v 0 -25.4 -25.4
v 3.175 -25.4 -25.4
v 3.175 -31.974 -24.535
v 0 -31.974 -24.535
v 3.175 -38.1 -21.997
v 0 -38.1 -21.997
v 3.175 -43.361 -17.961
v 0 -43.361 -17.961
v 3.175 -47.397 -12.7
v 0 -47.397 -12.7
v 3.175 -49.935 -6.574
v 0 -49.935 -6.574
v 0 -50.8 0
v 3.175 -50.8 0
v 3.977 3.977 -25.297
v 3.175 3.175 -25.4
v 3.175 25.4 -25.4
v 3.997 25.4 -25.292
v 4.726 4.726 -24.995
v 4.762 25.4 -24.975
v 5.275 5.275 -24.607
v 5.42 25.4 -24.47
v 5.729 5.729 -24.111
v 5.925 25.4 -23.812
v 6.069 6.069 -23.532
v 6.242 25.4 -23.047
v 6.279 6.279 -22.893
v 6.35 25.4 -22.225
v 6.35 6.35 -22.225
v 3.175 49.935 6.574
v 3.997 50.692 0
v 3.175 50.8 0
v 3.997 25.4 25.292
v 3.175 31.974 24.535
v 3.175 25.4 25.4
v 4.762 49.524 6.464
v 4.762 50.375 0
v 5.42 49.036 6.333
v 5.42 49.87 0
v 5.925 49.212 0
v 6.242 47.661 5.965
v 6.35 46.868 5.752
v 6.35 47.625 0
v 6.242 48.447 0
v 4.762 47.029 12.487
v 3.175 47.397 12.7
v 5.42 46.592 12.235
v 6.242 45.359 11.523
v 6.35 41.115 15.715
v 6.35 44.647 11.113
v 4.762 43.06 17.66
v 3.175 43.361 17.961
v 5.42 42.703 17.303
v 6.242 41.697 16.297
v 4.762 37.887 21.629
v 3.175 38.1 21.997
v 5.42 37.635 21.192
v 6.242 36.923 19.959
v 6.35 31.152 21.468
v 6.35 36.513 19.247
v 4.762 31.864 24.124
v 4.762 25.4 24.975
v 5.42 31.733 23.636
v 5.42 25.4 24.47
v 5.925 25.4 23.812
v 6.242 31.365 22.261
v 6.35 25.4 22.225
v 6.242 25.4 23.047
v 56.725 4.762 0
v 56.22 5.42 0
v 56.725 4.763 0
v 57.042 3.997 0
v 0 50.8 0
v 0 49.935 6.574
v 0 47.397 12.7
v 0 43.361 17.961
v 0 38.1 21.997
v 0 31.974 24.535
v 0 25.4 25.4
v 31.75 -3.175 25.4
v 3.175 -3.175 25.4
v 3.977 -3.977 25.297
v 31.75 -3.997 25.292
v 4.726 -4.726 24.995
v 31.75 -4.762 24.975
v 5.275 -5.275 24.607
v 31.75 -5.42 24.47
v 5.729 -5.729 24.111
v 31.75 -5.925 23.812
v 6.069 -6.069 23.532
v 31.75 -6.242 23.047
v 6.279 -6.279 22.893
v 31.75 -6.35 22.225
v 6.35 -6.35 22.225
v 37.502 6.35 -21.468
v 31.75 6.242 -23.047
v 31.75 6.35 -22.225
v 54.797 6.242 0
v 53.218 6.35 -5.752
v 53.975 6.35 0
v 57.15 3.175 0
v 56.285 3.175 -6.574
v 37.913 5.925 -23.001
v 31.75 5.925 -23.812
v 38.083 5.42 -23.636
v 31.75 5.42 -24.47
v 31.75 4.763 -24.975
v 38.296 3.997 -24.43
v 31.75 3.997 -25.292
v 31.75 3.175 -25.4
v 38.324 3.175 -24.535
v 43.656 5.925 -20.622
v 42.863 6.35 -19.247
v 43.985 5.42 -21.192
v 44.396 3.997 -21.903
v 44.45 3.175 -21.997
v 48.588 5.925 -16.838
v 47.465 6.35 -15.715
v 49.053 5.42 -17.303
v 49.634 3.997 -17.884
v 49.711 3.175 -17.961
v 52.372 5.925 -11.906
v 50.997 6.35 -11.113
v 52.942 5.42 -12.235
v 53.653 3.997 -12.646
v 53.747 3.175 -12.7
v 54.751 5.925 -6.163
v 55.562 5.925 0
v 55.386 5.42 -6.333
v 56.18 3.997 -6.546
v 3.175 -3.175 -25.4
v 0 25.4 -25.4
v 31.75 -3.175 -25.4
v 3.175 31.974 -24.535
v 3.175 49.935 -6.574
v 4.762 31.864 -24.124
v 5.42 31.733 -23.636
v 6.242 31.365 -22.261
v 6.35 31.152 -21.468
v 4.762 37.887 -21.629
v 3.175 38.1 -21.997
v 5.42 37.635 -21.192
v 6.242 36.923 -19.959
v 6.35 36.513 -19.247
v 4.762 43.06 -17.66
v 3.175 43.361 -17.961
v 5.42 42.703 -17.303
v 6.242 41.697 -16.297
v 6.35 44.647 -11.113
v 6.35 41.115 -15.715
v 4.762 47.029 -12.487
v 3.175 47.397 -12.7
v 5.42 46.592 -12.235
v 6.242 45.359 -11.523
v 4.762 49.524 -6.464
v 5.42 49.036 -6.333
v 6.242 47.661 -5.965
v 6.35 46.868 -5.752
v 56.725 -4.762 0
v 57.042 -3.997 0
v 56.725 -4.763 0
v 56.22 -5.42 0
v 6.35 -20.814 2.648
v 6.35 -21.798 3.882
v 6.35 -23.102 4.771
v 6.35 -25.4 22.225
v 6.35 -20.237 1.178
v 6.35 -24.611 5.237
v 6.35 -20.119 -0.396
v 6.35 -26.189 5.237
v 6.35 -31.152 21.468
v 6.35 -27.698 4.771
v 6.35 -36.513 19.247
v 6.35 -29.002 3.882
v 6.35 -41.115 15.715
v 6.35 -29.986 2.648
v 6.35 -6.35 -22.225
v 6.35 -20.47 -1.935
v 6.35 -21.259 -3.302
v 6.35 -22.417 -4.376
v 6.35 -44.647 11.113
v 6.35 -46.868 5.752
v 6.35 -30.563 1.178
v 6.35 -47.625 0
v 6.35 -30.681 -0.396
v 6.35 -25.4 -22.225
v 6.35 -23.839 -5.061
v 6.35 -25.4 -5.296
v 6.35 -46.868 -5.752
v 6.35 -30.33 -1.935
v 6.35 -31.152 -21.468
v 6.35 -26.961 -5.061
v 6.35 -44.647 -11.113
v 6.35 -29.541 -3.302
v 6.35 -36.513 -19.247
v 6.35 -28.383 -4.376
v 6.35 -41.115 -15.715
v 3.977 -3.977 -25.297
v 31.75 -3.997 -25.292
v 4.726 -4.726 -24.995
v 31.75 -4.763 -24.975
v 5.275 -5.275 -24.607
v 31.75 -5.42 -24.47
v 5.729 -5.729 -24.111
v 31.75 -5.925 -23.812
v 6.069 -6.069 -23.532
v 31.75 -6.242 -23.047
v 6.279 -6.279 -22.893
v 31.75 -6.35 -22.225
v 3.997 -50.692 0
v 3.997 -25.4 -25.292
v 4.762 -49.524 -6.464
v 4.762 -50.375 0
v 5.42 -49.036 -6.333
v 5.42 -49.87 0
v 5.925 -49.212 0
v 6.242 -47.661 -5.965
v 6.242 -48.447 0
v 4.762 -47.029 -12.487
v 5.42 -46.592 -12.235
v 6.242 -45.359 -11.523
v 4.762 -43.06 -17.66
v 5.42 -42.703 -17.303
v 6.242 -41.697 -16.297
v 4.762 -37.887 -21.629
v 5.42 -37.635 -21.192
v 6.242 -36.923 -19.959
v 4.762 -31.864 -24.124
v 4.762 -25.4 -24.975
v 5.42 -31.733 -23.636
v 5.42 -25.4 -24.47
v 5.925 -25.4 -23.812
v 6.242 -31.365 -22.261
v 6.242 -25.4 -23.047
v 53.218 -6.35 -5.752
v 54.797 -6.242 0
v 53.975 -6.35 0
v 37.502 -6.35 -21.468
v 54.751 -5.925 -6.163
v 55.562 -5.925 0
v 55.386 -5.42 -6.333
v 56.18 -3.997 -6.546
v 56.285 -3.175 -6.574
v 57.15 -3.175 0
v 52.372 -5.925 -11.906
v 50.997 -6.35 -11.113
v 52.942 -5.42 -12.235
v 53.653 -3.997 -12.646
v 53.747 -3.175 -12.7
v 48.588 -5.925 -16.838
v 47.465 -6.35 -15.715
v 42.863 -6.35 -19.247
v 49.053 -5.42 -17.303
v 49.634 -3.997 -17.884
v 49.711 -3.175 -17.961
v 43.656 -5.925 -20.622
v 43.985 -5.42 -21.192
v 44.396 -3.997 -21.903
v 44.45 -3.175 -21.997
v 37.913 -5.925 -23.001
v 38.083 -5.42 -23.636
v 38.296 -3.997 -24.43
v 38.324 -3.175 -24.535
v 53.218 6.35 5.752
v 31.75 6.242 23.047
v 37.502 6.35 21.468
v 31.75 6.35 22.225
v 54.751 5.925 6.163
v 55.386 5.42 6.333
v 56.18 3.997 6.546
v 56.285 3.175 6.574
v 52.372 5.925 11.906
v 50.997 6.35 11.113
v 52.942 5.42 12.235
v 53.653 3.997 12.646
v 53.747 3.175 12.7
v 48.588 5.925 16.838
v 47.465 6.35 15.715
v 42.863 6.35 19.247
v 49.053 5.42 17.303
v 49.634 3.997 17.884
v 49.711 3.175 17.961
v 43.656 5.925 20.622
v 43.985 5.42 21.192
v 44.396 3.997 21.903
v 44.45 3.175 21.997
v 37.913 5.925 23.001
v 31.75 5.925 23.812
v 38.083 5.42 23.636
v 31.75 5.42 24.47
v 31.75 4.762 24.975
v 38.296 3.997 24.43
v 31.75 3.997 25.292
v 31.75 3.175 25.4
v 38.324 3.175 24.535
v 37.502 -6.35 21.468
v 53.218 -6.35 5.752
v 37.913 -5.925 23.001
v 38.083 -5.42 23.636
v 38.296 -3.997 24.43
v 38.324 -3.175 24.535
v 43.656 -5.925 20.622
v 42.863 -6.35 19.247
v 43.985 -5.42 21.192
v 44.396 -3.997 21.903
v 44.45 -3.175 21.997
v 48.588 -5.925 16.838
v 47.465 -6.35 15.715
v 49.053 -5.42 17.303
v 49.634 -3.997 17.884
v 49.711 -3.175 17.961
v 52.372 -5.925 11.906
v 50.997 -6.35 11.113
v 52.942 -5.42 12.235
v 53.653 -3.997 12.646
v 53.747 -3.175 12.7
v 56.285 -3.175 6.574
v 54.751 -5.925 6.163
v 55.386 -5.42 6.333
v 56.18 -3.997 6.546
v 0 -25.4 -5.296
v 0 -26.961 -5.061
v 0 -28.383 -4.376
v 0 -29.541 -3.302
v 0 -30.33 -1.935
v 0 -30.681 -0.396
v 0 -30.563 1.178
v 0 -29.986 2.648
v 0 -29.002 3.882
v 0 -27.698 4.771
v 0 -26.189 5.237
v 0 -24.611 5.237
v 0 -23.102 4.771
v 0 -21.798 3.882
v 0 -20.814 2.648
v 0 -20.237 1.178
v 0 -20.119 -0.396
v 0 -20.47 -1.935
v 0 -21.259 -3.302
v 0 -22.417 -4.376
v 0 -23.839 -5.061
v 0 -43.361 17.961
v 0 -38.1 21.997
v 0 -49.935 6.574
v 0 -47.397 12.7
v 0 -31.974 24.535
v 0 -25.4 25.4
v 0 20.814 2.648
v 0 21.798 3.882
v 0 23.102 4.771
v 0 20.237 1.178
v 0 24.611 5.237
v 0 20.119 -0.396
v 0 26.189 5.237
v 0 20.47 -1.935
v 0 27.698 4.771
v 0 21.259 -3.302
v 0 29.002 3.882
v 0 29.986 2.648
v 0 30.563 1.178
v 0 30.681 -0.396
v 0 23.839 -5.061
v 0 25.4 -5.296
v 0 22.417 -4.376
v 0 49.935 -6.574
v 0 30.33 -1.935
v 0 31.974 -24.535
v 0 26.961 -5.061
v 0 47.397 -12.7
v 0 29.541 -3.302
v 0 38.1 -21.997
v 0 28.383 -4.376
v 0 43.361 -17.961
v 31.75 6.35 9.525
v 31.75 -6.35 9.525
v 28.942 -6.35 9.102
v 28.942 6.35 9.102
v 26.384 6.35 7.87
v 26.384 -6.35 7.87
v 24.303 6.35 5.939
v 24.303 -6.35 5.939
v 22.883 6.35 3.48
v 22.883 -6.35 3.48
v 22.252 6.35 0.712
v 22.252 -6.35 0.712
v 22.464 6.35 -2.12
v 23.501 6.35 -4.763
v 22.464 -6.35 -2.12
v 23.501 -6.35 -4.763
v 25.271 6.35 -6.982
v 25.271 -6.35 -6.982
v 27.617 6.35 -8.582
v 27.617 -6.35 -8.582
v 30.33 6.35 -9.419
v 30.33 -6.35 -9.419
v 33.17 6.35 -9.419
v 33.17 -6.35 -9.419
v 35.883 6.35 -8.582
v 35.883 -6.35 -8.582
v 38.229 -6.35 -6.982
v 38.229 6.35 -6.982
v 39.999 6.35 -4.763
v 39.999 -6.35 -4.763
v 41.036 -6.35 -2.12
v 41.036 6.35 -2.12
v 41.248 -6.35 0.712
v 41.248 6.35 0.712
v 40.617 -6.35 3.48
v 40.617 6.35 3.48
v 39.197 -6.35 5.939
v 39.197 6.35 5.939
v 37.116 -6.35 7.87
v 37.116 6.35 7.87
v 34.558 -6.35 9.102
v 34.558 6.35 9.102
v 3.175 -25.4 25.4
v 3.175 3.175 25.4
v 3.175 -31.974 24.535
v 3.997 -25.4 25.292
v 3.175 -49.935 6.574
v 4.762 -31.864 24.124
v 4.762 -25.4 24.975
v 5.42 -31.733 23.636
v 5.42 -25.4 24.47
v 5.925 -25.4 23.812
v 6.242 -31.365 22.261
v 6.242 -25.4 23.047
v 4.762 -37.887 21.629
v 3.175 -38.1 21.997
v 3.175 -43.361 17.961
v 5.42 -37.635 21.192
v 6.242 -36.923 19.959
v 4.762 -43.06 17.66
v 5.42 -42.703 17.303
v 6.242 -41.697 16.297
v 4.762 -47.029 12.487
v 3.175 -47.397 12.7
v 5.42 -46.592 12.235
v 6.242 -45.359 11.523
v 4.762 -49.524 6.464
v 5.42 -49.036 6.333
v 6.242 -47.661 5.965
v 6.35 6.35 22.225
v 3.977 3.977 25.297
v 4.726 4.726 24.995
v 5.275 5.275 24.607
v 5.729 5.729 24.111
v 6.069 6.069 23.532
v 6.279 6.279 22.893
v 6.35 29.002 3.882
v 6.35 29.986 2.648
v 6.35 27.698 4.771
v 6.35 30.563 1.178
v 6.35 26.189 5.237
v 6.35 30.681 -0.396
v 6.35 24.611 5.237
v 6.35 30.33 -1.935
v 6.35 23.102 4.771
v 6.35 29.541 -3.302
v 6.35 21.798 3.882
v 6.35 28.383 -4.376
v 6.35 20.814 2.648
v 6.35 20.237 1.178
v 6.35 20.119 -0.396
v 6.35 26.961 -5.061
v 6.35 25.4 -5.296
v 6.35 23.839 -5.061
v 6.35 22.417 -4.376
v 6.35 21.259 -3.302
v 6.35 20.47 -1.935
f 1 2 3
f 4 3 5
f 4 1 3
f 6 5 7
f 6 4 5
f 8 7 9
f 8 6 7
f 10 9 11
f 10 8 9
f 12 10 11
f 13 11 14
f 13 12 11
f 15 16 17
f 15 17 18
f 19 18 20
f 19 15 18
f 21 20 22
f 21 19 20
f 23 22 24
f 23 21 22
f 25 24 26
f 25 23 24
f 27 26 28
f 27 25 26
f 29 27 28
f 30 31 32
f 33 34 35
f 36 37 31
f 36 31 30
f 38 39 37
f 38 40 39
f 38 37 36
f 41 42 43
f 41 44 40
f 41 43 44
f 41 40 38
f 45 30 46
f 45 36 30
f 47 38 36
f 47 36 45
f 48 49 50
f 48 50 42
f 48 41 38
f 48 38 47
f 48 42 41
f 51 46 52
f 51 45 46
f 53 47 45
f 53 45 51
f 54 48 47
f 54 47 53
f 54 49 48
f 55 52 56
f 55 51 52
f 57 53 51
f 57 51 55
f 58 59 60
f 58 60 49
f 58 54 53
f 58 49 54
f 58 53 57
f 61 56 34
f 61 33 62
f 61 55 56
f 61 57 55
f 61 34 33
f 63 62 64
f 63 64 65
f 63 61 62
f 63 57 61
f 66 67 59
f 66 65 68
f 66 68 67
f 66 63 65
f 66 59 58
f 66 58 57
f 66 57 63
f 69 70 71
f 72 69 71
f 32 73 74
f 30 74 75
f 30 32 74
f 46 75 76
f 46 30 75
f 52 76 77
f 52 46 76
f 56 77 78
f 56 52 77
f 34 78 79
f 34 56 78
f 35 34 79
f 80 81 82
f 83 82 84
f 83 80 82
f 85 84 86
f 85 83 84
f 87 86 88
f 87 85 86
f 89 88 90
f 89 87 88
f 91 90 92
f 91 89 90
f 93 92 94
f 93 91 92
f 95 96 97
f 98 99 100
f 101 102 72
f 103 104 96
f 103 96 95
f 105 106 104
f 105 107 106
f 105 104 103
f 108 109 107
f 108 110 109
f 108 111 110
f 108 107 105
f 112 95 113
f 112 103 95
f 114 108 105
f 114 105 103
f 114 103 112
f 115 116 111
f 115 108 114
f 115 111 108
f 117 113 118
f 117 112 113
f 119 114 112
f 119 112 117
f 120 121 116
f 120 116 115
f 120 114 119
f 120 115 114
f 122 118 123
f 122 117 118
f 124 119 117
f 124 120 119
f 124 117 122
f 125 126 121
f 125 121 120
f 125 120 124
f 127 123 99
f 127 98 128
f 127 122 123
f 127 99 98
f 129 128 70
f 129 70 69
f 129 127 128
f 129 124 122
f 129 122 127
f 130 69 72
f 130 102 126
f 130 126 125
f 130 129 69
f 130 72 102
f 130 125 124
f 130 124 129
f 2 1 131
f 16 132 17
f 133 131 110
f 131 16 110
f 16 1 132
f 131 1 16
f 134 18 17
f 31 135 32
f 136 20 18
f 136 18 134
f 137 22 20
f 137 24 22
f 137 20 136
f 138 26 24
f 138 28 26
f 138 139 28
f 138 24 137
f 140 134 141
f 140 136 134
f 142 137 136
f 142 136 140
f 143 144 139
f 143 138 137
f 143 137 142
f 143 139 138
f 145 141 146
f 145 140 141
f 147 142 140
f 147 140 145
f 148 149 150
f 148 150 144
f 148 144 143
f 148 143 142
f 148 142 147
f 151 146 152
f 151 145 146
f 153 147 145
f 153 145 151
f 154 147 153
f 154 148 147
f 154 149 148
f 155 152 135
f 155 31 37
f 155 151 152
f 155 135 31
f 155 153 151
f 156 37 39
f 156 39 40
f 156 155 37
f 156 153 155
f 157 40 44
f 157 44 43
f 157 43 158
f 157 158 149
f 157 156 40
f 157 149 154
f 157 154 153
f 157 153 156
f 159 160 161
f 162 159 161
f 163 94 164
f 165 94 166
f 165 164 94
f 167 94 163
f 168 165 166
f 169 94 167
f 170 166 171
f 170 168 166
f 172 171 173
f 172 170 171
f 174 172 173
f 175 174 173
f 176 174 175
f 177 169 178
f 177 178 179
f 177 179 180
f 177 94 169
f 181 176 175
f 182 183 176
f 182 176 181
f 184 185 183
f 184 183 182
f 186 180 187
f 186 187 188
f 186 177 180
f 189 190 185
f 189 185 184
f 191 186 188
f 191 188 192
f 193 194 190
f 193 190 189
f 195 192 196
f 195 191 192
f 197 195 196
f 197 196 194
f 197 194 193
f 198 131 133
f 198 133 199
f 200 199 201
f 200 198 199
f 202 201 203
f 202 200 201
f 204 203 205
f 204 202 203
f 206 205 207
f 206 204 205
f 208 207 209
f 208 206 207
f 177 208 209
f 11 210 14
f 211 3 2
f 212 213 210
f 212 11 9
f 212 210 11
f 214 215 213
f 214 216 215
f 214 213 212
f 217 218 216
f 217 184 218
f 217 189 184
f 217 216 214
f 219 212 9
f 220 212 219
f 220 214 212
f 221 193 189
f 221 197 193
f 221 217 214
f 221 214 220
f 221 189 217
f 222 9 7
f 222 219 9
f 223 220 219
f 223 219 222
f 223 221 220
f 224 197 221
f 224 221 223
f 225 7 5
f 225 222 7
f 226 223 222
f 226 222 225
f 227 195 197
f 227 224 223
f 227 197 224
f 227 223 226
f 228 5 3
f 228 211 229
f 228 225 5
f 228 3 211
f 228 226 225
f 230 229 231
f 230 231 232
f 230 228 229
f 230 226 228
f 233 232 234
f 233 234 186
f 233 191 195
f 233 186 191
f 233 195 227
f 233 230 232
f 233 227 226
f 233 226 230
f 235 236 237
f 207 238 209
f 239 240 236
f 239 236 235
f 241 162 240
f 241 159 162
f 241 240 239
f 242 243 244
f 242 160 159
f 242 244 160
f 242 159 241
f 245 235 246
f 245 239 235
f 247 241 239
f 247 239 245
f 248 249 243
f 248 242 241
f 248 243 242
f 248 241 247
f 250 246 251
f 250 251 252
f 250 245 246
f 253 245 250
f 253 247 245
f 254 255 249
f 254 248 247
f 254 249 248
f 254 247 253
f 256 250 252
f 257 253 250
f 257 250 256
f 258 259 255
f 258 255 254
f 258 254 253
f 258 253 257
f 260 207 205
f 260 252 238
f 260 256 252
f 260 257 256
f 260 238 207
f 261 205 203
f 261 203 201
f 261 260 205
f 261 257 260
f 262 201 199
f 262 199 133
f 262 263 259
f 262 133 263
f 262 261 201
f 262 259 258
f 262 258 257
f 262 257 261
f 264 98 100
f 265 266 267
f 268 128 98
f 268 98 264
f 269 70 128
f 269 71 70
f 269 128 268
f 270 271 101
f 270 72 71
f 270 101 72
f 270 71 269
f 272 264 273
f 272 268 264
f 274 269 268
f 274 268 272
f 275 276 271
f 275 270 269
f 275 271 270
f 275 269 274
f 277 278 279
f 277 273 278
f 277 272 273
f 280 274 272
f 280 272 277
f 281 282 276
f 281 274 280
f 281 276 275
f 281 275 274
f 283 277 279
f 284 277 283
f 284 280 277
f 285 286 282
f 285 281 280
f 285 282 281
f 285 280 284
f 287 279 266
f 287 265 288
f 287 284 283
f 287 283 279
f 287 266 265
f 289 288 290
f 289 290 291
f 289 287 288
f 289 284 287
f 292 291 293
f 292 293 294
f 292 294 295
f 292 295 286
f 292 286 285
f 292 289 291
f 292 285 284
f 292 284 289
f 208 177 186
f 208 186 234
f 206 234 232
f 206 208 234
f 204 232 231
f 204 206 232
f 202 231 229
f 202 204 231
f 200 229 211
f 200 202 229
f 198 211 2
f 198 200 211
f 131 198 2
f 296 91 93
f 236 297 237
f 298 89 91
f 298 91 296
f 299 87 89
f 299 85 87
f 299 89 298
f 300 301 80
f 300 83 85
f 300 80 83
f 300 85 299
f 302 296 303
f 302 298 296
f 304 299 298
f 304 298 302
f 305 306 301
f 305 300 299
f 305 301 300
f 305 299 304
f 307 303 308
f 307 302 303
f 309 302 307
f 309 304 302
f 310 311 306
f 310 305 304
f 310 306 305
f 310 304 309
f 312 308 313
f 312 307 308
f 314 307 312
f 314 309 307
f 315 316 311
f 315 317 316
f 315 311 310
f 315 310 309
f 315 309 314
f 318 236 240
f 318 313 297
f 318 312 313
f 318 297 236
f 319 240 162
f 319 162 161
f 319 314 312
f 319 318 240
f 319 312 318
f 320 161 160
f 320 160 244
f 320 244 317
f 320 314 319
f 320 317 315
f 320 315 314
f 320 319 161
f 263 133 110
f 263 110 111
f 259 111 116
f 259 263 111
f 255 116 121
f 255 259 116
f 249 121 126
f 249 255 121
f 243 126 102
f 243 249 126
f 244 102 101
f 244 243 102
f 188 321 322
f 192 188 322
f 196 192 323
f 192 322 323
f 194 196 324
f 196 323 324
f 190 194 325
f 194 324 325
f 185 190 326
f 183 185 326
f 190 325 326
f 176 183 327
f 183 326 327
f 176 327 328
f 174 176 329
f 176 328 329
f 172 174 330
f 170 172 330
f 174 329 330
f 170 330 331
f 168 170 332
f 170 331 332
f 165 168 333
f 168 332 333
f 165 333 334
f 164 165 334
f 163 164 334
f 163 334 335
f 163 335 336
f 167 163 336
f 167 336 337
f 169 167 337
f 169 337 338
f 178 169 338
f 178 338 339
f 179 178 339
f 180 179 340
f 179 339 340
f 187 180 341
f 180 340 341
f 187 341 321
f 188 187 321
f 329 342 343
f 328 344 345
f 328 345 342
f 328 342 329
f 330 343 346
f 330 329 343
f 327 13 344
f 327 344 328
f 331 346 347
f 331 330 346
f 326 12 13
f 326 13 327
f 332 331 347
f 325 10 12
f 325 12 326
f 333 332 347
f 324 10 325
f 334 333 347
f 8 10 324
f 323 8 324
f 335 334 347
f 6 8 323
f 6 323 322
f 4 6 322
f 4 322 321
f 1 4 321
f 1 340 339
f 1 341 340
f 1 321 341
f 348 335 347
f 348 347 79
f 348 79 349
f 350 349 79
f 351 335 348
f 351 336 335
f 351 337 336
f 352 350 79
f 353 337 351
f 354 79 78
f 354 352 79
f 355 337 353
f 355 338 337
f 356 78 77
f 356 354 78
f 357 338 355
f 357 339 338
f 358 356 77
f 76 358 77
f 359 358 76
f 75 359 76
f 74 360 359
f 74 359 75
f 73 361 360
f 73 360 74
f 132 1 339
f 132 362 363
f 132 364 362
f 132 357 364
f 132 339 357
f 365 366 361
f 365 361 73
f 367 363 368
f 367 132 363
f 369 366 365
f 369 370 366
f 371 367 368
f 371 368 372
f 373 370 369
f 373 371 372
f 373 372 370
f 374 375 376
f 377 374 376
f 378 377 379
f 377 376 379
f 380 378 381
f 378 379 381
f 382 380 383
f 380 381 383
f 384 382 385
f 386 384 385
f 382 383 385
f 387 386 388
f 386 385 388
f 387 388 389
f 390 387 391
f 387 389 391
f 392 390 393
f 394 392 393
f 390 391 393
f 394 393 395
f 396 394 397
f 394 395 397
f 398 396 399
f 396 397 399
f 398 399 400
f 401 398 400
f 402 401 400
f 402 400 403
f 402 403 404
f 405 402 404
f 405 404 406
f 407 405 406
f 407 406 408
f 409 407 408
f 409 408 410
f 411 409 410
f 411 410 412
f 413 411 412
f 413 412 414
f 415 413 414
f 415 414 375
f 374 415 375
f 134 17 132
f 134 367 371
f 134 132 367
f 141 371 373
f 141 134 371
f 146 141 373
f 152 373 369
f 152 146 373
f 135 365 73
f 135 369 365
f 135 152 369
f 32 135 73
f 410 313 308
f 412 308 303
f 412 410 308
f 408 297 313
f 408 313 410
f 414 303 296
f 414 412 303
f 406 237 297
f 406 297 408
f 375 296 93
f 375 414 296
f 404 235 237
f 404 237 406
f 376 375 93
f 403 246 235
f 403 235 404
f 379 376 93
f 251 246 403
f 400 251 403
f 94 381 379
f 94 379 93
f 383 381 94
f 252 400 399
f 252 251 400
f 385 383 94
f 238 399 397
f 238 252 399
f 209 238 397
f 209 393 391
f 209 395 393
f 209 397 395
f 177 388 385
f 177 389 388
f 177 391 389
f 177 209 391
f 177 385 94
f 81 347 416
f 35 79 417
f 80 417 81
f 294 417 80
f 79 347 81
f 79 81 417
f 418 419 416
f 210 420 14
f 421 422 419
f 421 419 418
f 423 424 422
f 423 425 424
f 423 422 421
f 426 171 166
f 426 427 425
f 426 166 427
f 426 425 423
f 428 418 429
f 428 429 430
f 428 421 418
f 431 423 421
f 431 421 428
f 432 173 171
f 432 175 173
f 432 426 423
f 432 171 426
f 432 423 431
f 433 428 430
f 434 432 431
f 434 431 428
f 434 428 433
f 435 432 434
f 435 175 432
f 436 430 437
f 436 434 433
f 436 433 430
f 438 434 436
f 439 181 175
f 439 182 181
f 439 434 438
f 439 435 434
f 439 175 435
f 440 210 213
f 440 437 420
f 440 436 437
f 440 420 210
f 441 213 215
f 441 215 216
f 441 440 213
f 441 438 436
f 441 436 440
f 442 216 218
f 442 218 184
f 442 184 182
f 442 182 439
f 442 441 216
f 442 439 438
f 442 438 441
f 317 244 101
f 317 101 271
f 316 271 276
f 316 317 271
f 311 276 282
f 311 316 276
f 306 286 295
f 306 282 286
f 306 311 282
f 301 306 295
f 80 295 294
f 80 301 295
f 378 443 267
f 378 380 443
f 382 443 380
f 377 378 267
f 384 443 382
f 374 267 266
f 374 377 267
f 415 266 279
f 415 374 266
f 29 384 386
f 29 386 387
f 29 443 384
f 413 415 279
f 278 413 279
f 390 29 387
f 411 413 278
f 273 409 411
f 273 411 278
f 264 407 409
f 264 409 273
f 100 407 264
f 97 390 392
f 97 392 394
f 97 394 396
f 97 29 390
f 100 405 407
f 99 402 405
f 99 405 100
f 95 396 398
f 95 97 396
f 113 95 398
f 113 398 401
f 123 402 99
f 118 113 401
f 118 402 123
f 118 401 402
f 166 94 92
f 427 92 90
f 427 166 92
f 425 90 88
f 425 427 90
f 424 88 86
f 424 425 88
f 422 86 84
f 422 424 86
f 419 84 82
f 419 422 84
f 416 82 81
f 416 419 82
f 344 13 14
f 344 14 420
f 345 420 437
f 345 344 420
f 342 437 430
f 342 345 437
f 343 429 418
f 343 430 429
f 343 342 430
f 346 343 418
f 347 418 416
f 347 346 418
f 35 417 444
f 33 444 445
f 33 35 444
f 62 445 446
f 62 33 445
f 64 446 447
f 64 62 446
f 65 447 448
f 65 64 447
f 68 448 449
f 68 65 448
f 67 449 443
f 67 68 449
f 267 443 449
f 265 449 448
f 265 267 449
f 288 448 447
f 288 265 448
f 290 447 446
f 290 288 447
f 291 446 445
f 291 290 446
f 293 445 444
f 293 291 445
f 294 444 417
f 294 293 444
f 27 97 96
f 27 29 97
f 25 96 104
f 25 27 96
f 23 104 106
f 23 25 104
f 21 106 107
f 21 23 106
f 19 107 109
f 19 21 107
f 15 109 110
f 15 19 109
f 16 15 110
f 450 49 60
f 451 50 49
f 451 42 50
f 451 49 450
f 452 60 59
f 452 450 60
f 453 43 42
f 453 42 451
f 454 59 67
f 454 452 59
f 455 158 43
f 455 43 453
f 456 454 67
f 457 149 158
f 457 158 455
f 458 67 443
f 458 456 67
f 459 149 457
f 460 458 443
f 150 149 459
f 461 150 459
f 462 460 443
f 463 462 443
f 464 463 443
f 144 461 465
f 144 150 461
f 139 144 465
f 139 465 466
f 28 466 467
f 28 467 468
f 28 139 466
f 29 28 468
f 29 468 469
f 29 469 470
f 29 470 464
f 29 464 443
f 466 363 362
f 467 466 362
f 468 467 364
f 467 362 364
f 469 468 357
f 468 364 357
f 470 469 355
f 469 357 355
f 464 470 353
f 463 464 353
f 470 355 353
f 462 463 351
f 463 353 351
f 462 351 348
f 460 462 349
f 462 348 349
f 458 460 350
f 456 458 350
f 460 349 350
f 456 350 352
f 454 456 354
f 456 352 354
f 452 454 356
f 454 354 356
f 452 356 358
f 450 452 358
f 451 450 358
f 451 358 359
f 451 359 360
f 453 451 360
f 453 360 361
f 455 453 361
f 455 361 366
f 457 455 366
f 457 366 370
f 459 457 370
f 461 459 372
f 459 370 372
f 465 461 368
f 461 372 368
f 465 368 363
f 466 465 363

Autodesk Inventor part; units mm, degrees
ref_plane "YZ Plane" through (0, 0, 0) normal (1, 0, 0) x (0, 1, 0)
ref_plane "XZ Plane" through (0, 0, 0) normal (0, 1, 0) x (-1, 0, 0)
ref_plane "XY Plane" through (0, 0, 0) normal (0, 0, 1) x (1, 0, 0)
sketch "Sketch1" plane through (0, 0, 0) normal (0, 0, 1) x (1, 0, 0)
  line L0 (0, -50.8) -> (0, 50.8)
  line L1 (0, 50.8) -> (6.35, 50.8)
  line L2 (6.35, 50.8) -> (6.35, 6.35)
  line L3 (6.35, 6.35) -> (57.15, 6.35)
  line L4 (57.15, 6.35) -> (57.15, -6.35)
  line L5 (57.15, -6.35) -> (6.35, -6.35)
  line L6 (6.35, -6.35) -> (6.35, -50.8)
  line L7 (6.35, -50.8) -> (0, -50.8)
  line L8 (0, 0) -> (57.15, 0) construction
  dimension "d0" = 12.7
  dimension "d1" = 101.6
  dimension "d2" = 50.8
  dimension "d3" = 6.35
extrude "Extrusion1" add sketch "Sketch1" along normal mid plane 50.8
fillet "Fillet1" radius 25.4 6 edges at (57.15, 0, 25.4) (57.15, 0, -25.4) (3.175, 50.8, -25.4) (3.175, 50.8, 25.4) (3.175, -50.8, 25.4) (3.175, -50.8, -25.4)
fillet "Fillet2" radius 3.175 12 edges at (49.7105, 6.35, 17.9605) (19.05, 6.35, -25.4) (19.05, 6.35, 25.4) (49.7105, -6.35, 17.9605) (19.05, -6.35, -25.4) (19.05, -6.35, 25.4) (6.35, 15.875, -25.4) (6.35, 15.875, 25.4) (6.35, 43.3605, -17.9605) (6.35, -15.875, 25.4) (6.35, -15.875, -25.4) (6.35, -43.3605, 17.9605)
hole "Hole1" at (31.75, 6.35, 0) direction (0, -1, 0) diameter 19.05 end through all
sketch "Sketch2" plane through (6.35, 6.35, 22.225) normal (1, 0, 0) x (0, 0, -1)
  line L0 (22.225, 19.05) -> (22.225, -31.75) construction
  point P0 (22.225, -6.35)
  point P1 (22.225, -6.35)
  dimension "d17" = 50.8
hole "Hole2" at (6.35, 25.4, 0) at (6.35, -25.4, 0) direction (-1, 0, 0) diameter 10.5918 end through all thread size "1/2-13 UNC" class "2B" standard "ANSI Unified Screw Threads"
properties part number "Door Hinge" material "Steel, Alloy"
